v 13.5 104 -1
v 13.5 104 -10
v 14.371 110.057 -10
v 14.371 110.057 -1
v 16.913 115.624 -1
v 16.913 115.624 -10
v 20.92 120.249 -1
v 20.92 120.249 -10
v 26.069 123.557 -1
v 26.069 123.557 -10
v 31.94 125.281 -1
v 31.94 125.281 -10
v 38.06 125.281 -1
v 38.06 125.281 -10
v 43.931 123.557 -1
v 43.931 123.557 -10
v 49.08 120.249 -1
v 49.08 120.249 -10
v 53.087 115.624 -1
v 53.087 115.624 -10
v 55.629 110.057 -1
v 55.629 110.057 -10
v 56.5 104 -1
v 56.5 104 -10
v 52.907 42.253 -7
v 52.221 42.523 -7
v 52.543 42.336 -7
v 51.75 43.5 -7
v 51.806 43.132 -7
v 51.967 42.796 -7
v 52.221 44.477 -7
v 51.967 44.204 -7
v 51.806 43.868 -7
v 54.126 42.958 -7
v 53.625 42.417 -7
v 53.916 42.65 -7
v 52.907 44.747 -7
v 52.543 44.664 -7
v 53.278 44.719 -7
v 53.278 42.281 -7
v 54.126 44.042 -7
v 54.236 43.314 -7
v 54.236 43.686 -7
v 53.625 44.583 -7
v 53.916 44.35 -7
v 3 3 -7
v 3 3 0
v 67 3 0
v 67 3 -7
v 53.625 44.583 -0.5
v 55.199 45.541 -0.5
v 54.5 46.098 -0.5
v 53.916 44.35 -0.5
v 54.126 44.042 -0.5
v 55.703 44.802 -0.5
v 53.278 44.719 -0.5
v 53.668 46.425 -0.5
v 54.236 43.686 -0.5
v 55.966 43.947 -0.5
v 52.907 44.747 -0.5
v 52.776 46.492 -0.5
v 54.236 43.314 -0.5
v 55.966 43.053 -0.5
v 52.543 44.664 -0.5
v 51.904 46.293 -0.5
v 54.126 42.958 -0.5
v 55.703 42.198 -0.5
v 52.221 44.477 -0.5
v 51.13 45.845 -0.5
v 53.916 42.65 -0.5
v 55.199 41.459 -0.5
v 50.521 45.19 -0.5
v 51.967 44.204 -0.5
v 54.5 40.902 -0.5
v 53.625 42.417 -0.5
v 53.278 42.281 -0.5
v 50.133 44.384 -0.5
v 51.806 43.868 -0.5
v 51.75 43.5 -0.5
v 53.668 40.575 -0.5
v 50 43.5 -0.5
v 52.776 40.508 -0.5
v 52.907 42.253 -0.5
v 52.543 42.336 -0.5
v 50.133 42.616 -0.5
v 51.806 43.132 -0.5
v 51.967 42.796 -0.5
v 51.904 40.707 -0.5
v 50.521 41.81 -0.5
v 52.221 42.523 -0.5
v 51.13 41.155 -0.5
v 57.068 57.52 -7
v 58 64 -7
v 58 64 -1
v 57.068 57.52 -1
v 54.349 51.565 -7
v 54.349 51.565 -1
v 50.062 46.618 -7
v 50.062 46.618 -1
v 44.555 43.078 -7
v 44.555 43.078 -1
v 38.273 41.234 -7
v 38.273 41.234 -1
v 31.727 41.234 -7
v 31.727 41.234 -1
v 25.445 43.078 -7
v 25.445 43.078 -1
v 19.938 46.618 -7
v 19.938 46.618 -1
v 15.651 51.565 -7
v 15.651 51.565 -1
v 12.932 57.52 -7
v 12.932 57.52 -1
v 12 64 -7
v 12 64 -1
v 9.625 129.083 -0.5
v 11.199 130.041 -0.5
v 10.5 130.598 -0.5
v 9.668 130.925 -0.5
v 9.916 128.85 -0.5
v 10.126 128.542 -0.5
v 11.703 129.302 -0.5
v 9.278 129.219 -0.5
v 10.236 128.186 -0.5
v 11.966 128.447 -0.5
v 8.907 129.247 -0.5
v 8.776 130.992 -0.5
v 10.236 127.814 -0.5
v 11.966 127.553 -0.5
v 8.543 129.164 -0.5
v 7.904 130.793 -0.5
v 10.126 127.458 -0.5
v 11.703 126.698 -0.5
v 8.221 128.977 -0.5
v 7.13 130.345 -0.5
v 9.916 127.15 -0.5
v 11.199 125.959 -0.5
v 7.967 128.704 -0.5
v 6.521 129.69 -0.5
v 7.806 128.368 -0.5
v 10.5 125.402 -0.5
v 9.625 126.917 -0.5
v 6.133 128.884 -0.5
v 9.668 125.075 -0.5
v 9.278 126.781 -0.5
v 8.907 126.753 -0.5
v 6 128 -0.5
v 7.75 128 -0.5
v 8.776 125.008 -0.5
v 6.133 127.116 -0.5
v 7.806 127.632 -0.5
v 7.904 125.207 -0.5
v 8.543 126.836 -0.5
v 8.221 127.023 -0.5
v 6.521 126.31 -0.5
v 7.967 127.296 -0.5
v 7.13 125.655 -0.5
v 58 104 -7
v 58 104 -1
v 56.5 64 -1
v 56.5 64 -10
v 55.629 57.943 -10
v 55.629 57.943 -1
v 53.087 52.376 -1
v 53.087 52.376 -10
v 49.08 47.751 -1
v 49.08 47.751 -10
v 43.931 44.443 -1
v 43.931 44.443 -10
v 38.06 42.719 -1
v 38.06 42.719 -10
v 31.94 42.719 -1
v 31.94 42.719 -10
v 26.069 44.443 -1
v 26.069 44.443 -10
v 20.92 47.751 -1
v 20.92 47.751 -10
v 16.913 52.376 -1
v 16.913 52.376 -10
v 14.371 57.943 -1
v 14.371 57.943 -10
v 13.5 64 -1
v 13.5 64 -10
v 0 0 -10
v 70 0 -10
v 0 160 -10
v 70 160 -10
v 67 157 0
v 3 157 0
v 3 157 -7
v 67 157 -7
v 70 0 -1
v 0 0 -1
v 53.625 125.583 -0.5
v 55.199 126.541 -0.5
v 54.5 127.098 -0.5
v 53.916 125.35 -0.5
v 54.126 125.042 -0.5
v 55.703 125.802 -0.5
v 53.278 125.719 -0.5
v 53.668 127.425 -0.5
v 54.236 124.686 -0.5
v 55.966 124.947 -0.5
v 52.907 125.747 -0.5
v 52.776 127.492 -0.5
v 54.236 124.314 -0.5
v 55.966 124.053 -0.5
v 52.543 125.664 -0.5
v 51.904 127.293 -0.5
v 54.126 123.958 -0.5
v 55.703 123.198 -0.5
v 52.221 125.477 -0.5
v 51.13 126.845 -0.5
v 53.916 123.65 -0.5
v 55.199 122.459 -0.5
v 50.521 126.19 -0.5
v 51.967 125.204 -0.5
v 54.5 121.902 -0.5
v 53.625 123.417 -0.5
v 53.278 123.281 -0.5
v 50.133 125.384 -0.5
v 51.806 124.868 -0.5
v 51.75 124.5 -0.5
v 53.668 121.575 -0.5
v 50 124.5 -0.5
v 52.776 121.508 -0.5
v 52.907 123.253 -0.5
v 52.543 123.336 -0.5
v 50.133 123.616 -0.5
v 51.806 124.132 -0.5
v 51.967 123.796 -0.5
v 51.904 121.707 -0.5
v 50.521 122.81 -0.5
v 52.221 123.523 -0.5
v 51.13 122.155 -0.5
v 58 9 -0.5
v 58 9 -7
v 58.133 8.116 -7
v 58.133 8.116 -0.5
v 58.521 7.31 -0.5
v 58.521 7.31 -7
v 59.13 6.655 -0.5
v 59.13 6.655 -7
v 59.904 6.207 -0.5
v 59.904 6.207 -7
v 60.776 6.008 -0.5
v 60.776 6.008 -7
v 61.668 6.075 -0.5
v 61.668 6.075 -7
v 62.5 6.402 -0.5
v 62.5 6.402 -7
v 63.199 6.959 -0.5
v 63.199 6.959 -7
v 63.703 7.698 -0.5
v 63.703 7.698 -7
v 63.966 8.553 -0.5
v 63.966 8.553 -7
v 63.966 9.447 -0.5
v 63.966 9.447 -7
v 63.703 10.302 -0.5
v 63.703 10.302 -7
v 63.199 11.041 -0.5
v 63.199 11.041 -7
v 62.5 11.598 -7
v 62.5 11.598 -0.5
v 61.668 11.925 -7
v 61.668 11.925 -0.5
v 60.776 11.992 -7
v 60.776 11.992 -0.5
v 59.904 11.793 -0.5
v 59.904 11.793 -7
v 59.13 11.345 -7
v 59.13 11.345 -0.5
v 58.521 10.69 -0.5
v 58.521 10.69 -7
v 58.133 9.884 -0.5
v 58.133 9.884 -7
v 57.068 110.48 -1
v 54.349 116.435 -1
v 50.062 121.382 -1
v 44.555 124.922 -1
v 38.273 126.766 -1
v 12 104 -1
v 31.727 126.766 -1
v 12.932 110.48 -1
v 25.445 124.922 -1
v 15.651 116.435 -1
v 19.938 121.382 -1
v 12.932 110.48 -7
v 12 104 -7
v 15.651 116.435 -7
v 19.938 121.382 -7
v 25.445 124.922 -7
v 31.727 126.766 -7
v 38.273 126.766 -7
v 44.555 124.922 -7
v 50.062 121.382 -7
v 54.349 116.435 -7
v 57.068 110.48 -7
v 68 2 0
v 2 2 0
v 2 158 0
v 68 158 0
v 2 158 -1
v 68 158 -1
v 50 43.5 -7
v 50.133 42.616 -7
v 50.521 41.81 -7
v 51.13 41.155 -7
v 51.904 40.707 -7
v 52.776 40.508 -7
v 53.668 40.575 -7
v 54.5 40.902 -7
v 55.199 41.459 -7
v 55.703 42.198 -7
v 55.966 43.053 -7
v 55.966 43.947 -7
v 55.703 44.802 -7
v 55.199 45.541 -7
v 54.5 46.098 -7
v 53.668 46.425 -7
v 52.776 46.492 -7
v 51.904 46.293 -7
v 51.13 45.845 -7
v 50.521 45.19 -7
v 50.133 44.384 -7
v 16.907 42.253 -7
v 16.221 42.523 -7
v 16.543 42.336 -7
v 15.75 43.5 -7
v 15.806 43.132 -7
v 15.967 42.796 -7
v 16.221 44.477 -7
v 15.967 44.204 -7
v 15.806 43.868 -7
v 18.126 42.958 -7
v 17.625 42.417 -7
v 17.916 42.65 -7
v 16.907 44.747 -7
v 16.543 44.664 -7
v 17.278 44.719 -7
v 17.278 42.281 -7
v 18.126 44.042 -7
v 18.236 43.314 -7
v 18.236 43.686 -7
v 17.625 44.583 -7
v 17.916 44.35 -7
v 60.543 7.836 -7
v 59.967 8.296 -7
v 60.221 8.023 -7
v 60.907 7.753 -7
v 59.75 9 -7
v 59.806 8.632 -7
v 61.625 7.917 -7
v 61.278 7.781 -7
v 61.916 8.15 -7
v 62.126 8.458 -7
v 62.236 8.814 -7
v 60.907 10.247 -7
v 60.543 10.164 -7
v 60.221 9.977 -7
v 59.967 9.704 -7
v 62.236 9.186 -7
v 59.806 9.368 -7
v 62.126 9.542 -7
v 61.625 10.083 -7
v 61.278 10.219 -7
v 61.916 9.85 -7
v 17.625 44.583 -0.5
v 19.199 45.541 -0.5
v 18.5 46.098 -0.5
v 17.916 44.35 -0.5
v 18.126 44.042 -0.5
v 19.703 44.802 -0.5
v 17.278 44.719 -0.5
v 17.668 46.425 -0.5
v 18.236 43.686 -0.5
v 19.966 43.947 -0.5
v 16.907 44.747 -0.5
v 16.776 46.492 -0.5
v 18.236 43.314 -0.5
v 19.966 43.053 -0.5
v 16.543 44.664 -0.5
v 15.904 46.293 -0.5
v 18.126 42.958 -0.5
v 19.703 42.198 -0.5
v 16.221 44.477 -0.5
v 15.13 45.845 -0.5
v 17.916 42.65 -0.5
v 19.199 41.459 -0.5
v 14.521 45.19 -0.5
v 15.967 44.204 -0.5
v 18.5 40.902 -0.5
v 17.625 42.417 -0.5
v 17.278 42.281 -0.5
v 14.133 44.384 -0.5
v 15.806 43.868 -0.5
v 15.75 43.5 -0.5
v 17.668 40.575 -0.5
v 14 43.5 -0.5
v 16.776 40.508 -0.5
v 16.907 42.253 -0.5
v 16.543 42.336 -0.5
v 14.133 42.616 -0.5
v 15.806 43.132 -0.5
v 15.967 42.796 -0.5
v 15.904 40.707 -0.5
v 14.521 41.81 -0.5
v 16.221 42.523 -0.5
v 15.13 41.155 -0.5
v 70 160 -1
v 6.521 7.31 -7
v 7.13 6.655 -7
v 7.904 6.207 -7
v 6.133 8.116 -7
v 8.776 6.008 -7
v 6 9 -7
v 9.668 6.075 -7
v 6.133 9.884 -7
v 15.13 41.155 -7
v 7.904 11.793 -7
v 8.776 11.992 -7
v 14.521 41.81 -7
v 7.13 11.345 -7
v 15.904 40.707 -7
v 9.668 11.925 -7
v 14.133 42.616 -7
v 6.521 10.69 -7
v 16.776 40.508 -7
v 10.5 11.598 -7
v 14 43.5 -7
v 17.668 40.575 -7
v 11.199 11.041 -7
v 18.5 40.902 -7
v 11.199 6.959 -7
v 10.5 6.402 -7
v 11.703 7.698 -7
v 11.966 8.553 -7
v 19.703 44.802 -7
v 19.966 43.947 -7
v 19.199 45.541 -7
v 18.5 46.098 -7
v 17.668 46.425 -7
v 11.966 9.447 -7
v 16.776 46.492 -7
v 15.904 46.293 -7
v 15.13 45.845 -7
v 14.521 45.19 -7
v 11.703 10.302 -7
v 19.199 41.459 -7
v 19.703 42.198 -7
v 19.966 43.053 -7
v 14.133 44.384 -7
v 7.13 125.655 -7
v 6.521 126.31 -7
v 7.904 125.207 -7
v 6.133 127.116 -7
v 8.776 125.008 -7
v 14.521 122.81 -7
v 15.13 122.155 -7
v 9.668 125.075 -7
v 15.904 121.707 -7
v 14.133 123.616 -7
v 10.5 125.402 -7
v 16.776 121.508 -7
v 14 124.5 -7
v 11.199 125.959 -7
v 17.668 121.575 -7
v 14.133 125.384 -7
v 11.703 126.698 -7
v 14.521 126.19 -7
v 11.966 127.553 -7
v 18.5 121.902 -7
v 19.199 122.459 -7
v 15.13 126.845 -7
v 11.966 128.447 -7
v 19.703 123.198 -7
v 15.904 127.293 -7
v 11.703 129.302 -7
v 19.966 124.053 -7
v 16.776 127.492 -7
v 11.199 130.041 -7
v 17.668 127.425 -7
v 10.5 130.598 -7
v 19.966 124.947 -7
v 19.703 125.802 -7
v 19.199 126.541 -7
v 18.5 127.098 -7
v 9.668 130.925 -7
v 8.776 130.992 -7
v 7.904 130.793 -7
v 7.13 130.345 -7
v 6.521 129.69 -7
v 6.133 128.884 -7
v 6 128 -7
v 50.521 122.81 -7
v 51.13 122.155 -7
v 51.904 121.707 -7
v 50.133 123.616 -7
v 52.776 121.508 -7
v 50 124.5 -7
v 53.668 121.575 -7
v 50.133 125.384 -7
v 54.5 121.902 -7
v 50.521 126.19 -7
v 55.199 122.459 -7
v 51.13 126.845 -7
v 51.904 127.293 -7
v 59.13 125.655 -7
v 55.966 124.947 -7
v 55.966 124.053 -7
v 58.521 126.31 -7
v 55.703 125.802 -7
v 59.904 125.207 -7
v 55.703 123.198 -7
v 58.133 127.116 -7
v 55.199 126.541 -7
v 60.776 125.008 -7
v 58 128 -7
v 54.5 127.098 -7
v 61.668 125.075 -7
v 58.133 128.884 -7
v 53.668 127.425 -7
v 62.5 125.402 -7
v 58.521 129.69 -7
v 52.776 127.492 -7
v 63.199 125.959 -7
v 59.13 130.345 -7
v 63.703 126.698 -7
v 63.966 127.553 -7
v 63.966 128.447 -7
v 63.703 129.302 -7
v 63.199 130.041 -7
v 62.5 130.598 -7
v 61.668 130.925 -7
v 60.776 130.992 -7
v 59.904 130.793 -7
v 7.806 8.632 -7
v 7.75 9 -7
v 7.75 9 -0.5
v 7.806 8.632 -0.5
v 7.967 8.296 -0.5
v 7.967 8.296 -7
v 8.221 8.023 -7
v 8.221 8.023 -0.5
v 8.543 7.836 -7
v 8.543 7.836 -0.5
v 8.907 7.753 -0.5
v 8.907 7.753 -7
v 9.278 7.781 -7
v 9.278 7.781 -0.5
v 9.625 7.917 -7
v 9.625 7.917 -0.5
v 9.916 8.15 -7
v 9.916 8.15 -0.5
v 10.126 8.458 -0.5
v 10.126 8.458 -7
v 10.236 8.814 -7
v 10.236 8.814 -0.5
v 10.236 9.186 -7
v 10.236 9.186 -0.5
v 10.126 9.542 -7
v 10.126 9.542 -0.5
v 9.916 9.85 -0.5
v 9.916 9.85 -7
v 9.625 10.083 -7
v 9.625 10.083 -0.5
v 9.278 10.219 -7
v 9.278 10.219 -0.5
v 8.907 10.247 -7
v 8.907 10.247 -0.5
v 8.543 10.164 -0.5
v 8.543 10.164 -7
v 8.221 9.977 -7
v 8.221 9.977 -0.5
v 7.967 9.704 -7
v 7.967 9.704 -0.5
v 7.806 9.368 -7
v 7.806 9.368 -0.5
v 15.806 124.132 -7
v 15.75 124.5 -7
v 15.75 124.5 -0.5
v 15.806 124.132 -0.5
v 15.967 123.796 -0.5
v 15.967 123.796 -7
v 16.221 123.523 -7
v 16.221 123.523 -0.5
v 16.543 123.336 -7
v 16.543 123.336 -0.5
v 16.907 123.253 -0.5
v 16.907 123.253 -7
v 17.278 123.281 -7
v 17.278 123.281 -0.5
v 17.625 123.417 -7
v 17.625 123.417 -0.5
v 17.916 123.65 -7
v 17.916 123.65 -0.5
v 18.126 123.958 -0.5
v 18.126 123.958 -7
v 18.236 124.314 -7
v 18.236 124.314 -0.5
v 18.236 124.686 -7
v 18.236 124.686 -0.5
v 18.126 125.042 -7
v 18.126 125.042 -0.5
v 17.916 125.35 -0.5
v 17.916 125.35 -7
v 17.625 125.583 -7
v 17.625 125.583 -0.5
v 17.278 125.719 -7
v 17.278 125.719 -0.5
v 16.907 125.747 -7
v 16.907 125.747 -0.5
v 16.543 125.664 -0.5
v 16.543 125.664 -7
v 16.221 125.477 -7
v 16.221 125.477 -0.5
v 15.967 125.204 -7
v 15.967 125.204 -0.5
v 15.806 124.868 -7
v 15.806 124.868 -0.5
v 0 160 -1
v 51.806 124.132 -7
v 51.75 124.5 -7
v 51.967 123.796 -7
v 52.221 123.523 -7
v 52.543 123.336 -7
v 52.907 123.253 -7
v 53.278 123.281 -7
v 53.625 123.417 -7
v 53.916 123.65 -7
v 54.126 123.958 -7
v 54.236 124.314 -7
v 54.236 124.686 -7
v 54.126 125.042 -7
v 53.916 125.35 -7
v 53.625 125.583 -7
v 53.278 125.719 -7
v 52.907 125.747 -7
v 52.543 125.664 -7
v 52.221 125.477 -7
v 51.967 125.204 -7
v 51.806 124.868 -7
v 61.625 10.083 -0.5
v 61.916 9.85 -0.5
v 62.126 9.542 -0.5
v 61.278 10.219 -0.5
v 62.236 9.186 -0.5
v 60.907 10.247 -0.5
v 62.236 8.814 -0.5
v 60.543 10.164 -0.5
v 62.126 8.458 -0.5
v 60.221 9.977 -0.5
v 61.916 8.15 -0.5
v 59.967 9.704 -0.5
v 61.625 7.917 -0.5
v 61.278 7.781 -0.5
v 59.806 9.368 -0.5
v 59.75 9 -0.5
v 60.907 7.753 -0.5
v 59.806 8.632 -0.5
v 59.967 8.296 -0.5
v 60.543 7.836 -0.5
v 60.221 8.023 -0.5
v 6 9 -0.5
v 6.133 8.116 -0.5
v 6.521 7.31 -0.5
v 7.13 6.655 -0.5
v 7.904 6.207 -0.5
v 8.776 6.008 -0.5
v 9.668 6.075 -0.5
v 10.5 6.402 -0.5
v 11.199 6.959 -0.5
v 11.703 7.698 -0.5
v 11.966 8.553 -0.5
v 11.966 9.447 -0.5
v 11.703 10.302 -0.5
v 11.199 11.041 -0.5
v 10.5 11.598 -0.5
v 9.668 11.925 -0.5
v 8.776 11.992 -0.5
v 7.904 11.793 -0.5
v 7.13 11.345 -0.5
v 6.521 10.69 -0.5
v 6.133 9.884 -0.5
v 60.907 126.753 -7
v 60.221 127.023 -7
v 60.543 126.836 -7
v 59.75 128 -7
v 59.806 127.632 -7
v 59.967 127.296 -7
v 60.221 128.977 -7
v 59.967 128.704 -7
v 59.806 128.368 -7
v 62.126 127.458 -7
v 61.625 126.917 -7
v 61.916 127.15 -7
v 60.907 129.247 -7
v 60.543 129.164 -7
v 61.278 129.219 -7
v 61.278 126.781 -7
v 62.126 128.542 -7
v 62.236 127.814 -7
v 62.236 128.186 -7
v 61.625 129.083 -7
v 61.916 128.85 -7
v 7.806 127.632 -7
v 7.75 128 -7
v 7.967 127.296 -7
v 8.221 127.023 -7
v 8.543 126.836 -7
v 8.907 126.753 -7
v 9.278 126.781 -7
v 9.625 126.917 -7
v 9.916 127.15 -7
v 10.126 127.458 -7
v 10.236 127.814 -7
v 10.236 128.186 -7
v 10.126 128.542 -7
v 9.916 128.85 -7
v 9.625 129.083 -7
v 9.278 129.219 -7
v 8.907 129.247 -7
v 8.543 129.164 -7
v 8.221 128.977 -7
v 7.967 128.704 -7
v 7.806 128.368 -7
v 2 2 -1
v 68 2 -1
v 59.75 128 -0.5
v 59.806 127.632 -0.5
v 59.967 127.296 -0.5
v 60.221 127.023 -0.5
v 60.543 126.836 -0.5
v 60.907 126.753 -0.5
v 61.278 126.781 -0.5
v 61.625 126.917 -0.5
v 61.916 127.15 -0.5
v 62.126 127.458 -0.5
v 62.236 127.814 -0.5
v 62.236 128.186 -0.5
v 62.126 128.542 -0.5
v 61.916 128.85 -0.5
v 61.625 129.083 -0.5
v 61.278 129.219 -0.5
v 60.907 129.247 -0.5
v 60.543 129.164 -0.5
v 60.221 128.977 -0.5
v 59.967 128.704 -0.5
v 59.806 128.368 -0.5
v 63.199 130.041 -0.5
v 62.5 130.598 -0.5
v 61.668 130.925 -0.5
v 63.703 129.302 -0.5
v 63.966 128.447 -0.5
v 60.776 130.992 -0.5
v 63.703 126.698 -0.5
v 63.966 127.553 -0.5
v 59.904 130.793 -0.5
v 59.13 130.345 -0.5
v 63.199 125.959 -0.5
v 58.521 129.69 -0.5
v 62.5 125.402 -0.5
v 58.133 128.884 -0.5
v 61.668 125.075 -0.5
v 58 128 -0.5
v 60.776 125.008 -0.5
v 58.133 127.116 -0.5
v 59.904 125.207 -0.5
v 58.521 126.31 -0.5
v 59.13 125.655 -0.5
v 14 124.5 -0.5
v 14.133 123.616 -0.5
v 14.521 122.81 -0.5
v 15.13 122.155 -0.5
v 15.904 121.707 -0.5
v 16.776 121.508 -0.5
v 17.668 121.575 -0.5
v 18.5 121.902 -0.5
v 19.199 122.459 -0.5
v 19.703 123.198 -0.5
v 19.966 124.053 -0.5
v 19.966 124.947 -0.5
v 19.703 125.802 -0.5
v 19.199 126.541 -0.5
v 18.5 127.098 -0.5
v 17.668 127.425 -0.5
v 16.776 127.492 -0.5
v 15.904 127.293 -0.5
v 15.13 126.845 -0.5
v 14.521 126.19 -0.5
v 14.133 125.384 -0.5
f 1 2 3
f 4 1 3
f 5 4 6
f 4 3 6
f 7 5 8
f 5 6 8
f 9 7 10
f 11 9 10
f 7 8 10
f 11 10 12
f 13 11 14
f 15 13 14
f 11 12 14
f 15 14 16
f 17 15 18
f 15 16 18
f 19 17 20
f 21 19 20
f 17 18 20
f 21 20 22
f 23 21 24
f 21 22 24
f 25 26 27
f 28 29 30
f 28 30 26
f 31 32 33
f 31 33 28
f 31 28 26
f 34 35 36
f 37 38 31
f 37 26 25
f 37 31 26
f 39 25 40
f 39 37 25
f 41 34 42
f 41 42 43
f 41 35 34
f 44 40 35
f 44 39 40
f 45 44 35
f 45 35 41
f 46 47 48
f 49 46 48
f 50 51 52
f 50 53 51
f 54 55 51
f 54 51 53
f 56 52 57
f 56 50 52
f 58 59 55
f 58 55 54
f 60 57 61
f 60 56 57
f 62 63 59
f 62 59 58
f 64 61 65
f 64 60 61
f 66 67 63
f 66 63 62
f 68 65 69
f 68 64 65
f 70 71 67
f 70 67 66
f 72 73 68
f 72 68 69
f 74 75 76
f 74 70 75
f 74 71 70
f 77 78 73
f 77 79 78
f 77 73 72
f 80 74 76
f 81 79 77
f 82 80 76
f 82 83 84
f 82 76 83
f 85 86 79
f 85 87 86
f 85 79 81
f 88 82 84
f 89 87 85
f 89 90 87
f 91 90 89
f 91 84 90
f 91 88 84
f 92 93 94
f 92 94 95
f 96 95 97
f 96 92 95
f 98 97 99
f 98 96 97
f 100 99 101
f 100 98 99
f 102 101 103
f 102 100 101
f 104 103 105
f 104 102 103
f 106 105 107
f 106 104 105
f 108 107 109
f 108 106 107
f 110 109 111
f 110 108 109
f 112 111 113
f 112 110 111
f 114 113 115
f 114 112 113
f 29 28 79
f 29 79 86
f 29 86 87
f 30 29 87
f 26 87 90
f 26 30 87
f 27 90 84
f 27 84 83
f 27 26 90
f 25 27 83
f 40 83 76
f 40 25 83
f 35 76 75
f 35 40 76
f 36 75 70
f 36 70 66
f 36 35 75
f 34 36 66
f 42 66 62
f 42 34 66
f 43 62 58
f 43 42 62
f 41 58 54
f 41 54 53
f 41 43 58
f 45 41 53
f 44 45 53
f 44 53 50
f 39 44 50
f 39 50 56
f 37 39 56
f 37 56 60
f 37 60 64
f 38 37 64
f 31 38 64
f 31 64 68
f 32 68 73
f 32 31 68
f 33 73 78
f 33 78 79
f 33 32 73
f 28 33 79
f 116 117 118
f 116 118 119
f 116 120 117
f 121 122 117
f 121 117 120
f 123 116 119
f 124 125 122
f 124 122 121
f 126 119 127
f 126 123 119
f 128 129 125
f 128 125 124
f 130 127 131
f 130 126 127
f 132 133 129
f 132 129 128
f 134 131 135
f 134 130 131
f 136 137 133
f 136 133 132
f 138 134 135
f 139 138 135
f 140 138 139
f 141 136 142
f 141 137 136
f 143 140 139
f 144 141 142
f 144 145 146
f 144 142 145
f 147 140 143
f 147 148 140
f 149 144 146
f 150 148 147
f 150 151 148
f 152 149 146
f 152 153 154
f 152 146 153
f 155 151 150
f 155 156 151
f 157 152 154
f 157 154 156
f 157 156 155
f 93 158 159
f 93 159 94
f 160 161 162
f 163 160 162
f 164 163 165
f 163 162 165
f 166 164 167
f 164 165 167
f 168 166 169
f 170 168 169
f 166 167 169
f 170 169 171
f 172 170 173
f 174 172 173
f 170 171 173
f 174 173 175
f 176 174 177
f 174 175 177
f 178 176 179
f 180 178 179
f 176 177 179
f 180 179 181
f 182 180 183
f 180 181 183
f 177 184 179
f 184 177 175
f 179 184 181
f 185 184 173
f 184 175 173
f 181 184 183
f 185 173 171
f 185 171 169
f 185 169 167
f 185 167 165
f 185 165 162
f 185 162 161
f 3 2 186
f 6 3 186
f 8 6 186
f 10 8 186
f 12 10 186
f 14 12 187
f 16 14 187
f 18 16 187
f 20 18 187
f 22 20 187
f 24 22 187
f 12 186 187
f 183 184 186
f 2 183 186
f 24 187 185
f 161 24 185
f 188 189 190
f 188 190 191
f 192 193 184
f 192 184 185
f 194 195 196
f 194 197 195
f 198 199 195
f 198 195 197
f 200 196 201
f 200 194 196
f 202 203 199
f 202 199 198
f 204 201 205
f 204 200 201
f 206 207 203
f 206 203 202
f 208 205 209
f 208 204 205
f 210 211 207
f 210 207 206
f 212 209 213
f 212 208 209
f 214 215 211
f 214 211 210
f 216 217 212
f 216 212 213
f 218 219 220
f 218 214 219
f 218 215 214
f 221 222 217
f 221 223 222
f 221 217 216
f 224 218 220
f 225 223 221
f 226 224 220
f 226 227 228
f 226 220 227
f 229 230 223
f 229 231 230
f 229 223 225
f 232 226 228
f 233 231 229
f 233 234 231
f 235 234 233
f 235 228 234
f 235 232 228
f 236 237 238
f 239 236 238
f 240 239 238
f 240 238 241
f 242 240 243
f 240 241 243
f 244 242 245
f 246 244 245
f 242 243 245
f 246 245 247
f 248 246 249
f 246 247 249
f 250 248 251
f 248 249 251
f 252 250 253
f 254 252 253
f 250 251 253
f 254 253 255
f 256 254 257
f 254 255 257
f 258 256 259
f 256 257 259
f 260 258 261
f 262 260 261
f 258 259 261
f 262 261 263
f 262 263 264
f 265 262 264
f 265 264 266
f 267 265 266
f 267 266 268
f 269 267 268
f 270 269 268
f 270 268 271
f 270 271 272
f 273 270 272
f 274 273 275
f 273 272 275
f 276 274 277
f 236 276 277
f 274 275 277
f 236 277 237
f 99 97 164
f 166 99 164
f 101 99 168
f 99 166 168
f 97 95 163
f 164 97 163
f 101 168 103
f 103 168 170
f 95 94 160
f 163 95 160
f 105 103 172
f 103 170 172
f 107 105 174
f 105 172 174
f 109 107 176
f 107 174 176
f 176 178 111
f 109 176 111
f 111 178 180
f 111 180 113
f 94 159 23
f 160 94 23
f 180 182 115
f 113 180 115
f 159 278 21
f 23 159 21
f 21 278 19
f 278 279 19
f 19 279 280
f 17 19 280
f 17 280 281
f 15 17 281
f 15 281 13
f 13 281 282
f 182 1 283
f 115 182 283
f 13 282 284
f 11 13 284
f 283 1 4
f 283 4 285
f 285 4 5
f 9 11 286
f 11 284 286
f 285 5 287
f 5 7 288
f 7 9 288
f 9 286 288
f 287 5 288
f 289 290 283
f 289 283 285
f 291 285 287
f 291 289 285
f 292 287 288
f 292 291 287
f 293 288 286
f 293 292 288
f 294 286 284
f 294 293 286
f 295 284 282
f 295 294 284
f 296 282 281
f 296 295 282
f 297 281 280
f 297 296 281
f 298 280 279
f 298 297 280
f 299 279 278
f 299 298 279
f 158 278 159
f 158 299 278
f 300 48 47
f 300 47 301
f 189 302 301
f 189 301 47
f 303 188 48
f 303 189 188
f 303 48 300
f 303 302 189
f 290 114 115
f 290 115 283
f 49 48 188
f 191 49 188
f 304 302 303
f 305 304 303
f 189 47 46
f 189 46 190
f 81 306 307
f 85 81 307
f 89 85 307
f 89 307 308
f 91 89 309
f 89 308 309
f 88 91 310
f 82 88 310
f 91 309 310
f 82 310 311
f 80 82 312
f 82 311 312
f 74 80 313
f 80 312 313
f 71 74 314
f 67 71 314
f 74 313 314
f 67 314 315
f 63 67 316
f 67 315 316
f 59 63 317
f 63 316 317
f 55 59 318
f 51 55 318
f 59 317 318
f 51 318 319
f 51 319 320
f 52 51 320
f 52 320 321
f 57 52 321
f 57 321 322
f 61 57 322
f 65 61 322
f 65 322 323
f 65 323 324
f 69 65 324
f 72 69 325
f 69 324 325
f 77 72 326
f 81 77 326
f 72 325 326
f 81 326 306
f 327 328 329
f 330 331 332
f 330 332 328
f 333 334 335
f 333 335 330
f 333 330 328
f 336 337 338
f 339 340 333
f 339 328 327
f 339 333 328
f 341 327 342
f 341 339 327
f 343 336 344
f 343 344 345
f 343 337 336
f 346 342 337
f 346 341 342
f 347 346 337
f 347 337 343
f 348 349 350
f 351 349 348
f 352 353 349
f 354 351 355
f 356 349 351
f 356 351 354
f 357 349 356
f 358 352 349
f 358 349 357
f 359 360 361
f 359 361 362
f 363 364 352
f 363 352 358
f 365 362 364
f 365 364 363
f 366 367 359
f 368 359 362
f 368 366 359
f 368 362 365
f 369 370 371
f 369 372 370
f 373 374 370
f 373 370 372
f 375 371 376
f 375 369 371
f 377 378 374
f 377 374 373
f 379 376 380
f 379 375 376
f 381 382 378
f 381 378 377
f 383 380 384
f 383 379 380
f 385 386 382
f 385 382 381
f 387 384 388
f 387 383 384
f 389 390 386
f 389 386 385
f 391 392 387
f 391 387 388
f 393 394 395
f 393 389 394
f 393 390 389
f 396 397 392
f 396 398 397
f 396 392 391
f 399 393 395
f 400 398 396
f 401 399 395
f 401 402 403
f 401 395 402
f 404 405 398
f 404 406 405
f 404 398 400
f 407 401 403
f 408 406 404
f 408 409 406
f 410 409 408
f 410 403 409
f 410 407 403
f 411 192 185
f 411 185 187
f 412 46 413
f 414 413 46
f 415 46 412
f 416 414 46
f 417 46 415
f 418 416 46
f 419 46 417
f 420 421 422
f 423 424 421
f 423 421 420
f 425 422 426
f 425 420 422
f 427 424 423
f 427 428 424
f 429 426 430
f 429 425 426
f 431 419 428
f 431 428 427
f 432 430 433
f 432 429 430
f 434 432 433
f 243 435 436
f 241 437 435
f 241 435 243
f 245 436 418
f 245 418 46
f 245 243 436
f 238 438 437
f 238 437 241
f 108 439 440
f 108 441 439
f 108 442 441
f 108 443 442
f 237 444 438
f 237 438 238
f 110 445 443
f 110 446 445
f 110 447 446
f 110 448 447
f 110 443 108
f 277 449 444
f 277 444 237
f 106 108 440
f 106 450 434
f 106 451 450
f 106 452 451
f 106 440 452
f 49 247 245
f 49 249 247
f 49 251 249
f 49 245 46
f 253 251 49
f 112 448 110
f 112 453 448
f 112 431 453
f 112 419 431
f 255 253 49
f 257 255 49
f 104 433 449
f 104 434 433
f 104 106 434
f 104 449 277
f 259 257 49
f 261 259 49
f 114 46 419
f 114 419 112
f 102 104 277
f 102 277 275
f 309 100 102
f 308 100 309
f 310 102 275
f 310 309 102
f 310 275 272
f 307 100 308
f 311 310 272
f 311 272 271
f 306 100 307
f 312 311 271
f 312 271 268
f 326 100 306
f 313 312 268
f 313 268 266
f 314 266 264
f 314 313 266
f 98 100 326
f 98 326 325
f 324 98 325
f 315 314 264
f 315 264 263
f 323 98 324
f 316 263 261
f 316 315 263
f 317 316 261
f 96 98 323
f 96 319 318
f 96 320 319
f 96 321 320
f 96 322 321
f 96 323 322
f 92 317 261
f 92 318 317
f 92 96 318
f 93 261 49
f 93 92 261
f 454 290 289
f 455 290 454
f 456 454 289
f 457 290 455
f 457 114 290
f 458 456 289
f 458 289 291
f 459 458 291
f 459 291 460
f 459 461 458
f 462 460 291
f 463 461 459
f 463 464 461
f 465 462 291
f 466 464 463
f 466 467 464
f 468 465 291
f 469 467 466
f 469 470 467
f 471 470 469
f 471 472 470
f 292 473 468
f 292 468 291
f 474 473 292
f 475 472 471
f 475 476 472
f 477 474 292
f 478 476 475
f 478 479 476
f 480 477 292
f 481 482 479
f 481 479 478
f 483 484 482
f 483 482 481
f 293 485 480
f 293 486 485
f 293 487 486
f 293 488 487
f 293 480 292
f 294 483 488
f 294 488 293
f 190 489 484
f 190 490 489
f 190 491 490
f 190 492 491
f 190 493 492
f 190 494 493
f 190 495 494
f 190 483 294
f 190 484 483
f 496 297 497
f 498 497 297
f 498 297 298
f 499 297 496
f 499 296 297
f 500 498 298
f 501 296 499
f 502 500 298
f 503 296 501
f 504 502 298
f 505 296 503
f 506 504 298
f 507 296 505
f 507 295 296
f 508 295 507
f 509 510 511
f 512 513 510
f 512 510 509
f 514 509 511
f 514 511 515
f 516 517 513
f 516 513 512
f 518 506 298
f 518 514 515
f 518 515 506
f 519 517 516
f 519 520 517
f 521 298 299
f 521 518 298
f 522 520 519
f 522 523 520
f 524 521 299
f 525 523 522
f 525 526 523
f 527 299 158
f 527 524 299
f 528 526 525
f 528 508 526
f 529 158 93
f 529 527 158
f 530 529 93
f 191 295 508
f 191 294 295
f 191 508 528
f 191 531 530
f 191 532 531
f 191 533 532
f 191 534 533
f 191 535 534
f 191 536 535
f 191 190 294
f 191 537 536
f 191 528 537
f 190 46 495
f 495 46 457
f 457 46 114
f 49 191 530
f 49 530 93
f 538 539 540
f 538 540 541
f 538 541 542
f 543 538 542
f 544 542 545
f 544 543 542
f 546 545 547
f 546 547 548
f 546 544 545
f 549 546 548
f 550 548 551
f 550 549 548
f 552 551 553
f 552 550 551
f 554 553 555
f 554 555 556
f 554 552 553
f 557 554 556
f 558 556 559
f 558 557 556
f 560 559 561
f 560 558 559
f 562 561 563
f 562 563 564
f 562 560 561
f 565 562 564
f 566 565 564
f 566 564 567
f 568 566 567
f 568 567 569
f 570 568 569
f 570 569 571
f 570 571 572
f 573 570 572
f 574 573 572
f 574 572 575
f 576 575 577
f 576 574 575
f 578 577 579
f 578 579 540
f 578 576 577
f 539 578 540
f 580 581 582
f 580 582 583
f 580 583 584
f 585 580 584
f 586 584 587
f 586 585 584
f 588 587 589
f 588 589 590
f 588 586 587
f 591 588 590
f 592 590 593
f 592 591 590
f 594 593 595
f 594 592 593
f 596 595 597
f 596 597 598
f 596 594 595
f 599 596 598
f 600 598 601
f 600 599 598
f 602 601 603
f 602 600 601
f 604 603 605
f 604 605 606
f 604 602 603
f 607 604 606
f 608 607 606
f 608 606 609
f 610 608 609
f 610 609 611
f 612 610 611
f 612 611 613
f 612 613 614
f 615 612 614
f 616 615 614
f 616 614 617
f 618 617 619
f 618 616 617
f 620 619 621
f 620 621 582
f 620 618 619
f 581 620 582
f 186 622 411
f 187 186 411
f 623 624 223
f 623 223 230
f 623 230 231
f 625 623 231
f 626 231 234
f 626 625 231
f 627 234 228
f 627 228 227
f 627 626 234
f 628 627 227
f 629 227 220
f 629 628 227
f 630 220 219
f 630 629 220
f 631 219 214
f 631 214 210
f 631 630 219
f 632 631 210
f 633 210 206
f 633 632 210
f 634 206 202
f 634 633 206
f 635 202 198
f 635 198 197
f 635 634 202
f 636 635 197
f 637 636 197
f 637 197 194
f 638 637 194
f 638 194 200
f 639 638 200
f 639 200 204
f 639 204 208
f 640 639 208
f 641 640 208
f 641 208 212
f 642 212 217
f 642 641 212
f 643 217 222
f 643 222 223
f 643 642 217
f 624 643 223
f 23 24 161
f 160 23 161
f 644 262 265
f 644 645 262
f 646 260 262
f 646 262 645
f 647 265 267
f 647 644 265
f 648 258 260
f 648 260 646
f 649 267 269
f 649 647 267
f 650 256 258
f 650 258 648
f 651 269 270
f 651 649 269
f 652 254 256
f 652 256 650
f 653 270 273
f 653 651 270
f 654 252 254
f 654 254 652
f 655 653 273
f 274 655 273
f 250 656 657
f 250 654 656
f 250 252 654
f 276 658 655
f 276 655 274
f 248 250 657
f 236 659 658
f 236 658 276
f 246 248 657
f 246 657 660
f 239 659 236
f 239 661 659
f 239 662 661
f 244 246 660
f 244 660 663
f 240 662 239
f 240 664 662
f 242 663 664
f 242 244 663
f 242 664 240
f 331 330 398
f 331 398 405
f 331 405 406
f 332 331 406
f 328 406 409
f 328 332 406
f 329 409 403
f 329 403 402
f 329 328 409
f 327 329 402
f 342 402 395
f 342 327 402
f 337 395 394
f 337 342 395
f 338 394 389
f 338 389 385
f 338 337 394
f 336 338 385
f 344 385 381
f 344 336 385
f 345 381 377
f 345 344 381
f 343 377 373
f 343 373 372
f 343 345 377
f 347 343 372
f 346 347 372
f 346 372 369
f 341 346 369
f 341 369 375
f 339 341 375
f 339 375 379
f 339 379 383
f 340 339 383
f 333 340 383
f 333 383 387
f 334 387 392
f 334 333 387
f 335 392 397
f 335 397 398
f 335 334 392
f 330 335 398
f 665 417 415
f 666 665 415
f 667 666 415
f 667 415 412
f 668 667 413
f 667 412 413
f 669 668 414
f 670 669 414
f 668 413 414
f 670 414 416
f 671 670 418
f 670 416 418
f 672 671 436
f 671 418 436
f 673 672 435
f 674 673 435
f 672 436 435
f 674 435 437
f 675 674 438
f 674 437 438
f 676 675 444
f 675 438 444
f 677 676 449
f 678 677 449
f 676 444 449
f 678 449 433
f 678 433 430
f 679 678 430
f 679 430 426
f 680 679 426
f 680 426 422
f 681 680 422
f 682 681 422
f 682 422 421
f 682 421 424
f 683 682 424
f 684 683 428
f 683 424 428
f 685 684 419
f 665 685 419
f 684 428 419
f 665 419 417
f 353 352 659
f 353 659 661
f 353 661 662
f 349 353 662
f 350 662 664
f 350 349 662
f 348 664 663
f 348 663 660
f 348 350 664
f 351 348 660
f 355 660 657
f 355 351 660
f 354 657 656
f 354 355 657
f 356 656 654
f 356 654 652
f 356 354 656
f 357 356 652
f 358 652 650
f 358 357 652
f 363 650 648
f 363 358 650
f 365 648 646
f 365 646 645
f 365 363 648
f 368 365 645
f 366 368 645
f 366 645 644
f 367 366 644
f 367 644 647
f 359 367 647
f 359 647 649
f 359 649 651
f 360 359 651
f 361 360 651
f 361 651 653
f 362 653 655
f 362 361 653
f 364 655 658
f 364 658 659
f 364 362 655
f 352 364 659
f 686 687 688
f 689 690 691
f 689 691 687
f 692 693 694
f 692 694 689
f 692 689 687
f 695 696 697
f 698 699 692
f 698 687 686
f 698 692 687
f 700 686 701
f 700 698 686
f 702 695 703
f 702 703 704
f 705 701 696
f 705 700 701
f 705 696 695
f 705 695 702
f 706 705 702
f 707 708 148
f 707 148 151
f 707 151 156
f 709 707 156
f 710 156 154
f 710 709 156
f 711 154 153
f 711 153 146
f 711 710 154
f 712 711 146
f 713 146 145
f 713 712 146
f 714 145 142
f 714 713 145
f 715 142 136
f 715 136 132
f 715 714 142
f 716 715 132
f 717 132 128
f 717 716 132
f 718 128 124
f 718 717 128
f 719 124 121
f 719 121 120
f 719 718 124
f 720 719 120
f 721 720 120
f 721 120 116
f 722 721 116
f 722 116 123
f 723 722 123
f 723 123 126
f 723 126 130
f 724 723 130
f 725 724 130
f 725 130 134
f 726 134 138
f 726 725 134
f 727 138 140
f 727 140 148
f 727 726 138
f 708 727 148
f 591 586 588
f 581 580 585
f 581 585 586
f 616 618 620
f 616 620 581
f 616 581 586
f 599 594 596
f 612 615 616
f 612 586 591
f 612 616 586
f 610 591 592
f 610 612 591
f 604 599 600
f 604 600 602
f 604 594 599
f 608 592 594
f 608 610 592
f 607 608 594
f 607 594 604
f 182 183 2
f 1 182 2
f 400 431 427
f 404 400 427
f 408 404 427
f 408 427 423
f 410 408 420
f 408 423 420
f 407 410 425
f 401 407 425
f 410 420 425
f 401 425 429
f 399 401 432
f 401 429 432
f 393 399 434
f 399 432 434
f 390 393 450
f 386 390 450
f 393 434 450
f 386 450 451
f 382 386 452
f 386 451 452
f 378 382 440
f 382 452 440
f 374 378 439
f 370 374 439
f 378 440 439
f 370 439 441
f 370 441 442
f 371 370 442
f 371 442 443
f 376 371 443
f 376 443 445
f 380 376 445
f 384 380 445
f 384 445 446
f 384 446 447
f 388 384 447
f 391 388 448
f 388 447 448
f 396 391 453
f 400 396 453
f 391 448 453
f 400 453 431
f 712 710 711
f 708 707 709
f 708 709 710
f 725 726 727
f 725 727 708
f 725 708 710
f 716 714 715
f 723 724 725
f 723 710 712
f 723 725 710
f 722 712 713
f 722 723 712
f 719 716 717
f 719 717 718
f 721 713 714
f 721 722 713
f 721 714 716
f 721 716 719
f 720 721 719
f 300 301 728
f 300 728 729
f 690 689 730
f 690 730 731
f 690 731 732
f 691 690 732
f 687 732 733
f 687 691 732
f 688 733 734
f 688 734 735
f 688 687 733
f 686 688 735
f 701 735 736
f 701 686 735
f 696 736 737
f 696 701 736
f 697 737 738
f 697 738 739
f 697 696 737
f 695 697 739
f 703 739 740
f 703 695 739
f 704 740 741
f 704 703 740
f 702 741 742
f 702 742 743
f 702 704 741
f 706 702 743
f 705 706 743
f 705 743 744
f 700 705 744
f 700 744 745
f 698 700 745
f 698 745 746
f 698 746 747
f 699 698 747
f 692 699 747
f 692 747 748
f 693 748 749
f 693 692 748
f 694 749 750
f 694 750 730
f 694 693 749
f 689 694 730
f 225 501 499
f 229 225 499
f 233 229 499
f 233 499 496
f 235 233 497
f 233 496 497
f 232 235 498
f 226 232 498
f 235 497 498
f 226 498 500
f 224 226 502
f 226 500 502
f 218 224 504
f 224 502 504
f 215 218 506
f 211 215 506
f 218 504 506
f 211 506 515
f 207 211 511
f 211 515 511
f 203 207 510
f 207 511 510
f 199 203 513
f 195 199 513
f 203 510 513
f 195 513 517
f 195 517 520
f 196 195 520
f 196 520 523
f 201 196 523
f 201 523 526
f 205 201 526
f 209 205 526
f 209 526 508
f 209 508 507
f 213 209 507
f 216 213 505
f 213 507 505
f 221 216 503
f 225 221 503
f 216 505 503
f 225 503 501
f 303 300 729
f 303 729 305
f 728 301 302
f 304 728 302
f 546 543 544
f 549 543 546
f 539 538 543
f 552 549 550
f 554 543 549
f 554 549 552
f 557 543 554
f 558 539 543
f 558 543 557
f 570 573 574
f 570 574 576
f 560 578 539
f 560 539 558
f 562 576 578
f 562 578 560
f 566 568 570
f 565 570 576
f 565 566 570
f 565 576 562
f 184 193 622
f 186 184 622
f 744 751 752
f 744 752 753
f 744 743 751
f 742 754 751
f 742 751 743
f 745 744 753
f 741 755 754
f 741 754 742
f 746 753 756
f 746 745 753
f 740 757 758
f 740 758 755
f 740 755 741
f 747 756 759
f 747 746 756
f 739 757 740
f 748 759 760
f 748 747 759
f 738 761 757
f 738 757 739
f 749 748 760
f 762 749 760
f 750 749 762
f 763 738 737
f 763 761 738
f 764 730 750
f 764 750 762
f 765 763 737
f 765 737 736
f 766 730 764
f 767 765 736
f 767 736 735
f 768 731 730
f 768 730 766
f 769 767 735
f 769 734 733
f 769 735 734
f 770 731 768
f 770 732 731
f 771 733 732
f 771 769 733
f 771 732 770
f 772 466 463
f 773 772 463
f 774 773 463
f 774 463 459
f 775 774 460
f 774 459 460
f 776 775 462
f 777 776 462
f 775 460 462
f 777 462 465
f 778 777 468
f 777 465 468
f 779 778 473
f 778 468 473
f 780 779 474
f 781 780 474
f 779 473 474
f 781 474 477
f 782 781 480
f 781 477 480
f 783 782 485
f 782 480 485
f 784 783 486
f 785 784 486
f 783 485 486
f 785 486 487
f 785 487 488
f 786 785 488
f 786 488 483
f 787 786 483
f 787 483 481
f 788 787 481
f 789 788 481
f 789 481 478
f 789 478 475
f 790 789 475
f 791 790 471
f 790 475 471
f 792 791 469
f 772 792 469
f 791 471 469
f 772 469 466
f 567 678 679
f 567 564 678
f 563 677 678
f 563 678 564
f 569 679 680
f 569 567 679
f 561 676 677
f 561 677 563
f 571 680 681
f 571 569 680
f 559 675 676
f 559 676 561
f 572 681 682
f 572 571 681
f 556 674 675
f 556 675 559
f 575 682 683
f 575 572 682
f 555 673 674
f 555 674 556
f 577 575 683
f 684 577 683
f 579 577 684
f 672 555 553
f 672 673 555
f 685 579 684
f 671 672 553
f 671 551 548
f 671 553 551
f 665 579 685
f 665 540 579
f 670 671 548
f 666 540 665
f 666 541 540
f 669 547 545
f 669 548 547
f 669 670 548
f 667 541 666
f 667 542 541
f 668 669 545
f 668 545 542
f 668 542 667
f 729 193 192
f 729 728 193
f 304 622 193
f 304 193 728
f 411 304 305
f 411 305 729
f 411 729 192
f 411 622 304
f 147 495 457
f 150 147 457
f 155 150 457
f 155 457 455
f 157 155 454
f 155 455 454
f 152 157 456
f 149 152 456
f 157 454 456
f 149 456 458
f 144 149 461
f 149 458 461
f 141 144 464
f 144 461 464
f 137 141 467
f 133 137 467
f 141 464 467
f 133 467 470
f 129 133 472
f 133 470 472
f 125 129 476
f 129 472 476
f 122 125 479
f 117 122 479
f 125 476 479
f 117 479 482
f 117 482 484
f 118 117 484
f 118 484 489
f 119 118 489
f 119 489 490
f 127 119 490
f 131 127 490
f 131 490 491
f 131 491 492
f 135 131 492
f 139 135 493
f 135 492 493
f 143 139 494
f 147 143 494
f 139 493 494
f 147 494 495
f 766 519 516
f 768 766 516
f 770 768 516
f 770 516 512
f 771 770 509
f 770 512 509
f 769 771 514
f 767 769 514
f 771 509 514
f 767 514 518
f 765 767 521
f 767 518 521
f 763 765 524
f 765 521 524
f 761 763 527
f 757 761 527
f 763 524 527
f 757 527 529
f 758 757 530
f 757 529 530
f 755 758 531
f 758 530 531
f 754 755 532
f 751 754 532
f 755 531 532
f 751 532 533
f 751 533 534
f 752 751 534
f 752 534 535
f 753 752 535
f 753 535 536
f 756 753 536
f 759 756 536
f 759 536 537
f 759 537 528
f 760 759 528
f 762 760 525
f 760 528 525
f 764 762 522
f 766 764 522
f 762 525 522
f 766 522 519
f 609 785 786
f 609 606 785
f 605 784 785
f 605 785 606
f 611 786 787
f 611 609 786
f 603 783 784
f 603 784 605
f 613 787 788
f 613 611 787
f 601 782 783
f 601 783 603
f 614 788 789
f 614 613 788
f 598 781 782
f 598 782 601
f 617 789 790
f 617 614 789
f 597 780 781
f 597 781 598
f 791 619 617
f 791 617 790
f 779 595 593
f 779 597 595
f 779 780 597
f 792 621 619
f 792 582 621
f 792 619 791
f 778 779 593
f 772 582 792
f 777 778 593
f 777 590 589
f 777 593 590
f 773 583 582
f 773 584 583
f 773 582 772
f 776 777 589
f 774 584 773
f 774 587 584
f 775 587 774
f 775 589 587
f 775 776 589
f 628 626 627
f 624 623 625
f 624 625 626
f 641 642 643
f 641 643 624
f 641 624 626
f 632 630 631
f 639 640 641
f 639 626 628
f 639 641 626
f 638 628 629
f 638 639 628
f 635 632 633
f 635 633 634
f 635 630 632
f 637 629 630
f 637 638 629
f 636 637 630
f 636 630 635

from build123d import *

# Parameters (mm, degrees)
CROQUIS1_W              = 70
CROQUIS1_H              = 160
SALIENTE_EXTRUIR1_DEPTH = 10
VACIADO1_T              = -3
CROQUIS2_W              = 70
CROQUIS2_H              = 160
CROQUIS2_W_2            = 66
CROQUIS2_H_2            = 156
CORTAR_EXTRUIR1_DEPTH   = 1
SALIENTE_EXTRUIR2_DEPTH = 6
CORTAR_EXTRUIR2_START   = -6
CORTAR_EXTRUIR2_DEPTH   = 6
CROQUIS5_R              = 3
CROQUIS5_R_2            = 1.25
SALIENTE_EXTRUIR3_DEPTH = 6.5
CROQUIS6_R              = 3
CROQUIS6_R_2            = 1.25
SALIENTE_EXTRUIR4_DEPTH = 6.5


with BuildPart() as part:
    # Croquis1 → Saliente-Extruir1 (new body)
    with BuildSketch(Plane.XY):
        with Locations((35, 80)):
            Rectangle(CROQUIS1_W, CROQUIS1_H)
    extrude(amount=-SALIENTE_EXTRUIR1_DEPTH)

    # Vaciado1
    vaciado1_openings = [part.faces().sort_by_distance(p)[0] for p in [
        (35, 80, 0),
    ]]
    offset(amount=VACIADO1_T, openings=vaciado1_openings, kind=Kind.INTERSECTION)

    # Croquis2 → Cortar-Extruir1 (cut)
    with BuildSketch(Plane.XY):
        with Locations((35, 80)):
            Rectangle(CROQUIS2_W, CROQUIS2_H)
        with Locations((35, 80)):
            Rectangle(CROQUIS2_W_2, CROQUIS2_H_2, mode=Mode.SUBTRACT)
    extrude(amount=-CORTAR_EXTRUIR1_DEPTH, mode=Mode.SUBTRACT)

    # Croquis3 → Saliente-Extruir2 (add)
    with BuildSketch(Plane.XY.offset(-7)):
        with BuildLine():
            Line((58, 104), (58, 64))
            ThreePointArc((58, 64), (35, 41), (12, 64))
            Line((12, 64), (12, 104))
            ThreePointArc((12, 104), (35, 127), (58, 104))
        make_face()
        with BuildLine():
            Line((56.5, 104), (56.5, 64))
            ThreePointArc((56.5, 64), (35, 42.5), (13.5, 64))
            Line((13.5, 64), (13.5, 104))
            ThreePointArc((13.5, 104), (35, 125.5), (56.5, 104))
        make_face(mode=Mode.SUBTRACT)
    extrude(amount=SALIENTE_EXTRUIR2_DEPTH)

    # Croquis4 → Cortar-Extruir2 (cut)
    with BuildSketch(Plane.XY.offset(-7).offset(CORTAR_EXTRUIR2_START)):
        with BuildLine():
            Line((56.5, 104), (56.5, 64))
            ThreePointArc((56.5, 64), (35, 42.5), (13.5, 64))
            Line((13.5, 64), (13.5, 104))
            ThreePointArc((13.5, 104), (35, 125.5), (56.5, 104))
        make_face()
    extrude(amount=CORTAR_EXTRUIR2_DEPTH, mode=Mode.SUBTRACT)

    # Croquis5 → Saliente-Extruir3 (add)
    # profile 1 of 4: a face of its own
    with BuildSketch(Plane.XY.offset(-7)):
        with Locations(Location((17, 124.5, 0), (0, 0, 180))):
            Circle(CROQUIS5_R)
        with Locations(Location((17, 124.5, 0), (0, 0, 180))):
            Circle(CROQUIS5_R_2, mode=Mode.SUBTRACT)
    # profile 2 of 4: a face of its own
    with BuildSketch(Plane.XY.offset(-7)):
        with Locations(Location((53, 124.5, 0), (0, 0, 180))):
            Circle(CROQUIS5_R)
        with Locations(Location((53, 124.5, 0), (0, 0, 180))):
            Circle(CROQUIS5_R_2, mode=Mode.SUBTRACT)
    # profile 3 of 4: a face of its own
    with BuildSketch(Plane.XY.offset(-7)):
        with Locations(Location((17, 43.5, 0), (0, 0, 180))):
            Circle(CROQUIS5_R)
        with Locations(Location((17, 43.5, 0), (0, 0, 180))):
            Circle(CROQUIS5_R_2, mode=Mode.SUBTRACT)
    # profile 4 of 4: a face of its own
    with BuildSketch(Plane.XY.offset(-7)):
        with Locations(Location((53, 43.5, 0), (0, 0, 180))):
            Circle(CROQUIS5_R)
        with Locations(Location((53, 43.5, 0), (0, 0, 180))):
            Circle(CROQUIS5_R_2, mode=Mode.SUBTRACT)
    extrude(amount=SALIENTE_EXTRUIR3_DEPTH)

    # Croquis6 → Saliente-Extruir4 (add)
    # profile 1 of 4: a face of its own
    with BuildSketch(Plane.XY.offset(-7)):
        with Locations(Location((9, 9, 0), (0, 0, 180))):
            Circle(CROQUIS6_R)
        with Locations(Location((9, 9, 0), (0, 0, 180))):
            Circle(CROQUIS6_R_2, mode=Mode.SUBTRACT)
    # profile 2 of 4: a face of its own
    with BuildSketch(Plane.XY.offset(-7)):
        with Locations(Location((61, 9, 0), (0, 0, 180))):
            Circle(CROQUIS6_R)
        with Locations(Location((61, 9, 0), (0, 0, 180))):
            Circle(CROQUIS6_R_2, mode=Mode.SUBTRACT)
    # profile 3 of 4: a face of its own
    with BuildSketch(Plane.XY.offset(-7)):
        with Locations(Location((9, 128, 0), (0, 0, 180))):
            Circle(CROQUIS6_R)
        with Locations(Location((9, 128, 0), (0, 0, 180))):
            Circle(CROQUIS6_R_2, mode=Mode.SUBTRACT)
    # profile 4 of 4: a face of its own
    with BuildSketch(Plane.XY.offset(-7)):
        with Locations(Location((61, 128, 0), (0, 0, 180))):
            Circle(CROQUIS6_R)
        with Locations(Location((61, 128, 0), (0, 0, 180))):
            Circle(CROQUIS6_R_2, mode=Mode.SUBTRACT)
    extrude(amount=SALIENTE_EXTRUIR4_DEPTH)


solid = part.part
